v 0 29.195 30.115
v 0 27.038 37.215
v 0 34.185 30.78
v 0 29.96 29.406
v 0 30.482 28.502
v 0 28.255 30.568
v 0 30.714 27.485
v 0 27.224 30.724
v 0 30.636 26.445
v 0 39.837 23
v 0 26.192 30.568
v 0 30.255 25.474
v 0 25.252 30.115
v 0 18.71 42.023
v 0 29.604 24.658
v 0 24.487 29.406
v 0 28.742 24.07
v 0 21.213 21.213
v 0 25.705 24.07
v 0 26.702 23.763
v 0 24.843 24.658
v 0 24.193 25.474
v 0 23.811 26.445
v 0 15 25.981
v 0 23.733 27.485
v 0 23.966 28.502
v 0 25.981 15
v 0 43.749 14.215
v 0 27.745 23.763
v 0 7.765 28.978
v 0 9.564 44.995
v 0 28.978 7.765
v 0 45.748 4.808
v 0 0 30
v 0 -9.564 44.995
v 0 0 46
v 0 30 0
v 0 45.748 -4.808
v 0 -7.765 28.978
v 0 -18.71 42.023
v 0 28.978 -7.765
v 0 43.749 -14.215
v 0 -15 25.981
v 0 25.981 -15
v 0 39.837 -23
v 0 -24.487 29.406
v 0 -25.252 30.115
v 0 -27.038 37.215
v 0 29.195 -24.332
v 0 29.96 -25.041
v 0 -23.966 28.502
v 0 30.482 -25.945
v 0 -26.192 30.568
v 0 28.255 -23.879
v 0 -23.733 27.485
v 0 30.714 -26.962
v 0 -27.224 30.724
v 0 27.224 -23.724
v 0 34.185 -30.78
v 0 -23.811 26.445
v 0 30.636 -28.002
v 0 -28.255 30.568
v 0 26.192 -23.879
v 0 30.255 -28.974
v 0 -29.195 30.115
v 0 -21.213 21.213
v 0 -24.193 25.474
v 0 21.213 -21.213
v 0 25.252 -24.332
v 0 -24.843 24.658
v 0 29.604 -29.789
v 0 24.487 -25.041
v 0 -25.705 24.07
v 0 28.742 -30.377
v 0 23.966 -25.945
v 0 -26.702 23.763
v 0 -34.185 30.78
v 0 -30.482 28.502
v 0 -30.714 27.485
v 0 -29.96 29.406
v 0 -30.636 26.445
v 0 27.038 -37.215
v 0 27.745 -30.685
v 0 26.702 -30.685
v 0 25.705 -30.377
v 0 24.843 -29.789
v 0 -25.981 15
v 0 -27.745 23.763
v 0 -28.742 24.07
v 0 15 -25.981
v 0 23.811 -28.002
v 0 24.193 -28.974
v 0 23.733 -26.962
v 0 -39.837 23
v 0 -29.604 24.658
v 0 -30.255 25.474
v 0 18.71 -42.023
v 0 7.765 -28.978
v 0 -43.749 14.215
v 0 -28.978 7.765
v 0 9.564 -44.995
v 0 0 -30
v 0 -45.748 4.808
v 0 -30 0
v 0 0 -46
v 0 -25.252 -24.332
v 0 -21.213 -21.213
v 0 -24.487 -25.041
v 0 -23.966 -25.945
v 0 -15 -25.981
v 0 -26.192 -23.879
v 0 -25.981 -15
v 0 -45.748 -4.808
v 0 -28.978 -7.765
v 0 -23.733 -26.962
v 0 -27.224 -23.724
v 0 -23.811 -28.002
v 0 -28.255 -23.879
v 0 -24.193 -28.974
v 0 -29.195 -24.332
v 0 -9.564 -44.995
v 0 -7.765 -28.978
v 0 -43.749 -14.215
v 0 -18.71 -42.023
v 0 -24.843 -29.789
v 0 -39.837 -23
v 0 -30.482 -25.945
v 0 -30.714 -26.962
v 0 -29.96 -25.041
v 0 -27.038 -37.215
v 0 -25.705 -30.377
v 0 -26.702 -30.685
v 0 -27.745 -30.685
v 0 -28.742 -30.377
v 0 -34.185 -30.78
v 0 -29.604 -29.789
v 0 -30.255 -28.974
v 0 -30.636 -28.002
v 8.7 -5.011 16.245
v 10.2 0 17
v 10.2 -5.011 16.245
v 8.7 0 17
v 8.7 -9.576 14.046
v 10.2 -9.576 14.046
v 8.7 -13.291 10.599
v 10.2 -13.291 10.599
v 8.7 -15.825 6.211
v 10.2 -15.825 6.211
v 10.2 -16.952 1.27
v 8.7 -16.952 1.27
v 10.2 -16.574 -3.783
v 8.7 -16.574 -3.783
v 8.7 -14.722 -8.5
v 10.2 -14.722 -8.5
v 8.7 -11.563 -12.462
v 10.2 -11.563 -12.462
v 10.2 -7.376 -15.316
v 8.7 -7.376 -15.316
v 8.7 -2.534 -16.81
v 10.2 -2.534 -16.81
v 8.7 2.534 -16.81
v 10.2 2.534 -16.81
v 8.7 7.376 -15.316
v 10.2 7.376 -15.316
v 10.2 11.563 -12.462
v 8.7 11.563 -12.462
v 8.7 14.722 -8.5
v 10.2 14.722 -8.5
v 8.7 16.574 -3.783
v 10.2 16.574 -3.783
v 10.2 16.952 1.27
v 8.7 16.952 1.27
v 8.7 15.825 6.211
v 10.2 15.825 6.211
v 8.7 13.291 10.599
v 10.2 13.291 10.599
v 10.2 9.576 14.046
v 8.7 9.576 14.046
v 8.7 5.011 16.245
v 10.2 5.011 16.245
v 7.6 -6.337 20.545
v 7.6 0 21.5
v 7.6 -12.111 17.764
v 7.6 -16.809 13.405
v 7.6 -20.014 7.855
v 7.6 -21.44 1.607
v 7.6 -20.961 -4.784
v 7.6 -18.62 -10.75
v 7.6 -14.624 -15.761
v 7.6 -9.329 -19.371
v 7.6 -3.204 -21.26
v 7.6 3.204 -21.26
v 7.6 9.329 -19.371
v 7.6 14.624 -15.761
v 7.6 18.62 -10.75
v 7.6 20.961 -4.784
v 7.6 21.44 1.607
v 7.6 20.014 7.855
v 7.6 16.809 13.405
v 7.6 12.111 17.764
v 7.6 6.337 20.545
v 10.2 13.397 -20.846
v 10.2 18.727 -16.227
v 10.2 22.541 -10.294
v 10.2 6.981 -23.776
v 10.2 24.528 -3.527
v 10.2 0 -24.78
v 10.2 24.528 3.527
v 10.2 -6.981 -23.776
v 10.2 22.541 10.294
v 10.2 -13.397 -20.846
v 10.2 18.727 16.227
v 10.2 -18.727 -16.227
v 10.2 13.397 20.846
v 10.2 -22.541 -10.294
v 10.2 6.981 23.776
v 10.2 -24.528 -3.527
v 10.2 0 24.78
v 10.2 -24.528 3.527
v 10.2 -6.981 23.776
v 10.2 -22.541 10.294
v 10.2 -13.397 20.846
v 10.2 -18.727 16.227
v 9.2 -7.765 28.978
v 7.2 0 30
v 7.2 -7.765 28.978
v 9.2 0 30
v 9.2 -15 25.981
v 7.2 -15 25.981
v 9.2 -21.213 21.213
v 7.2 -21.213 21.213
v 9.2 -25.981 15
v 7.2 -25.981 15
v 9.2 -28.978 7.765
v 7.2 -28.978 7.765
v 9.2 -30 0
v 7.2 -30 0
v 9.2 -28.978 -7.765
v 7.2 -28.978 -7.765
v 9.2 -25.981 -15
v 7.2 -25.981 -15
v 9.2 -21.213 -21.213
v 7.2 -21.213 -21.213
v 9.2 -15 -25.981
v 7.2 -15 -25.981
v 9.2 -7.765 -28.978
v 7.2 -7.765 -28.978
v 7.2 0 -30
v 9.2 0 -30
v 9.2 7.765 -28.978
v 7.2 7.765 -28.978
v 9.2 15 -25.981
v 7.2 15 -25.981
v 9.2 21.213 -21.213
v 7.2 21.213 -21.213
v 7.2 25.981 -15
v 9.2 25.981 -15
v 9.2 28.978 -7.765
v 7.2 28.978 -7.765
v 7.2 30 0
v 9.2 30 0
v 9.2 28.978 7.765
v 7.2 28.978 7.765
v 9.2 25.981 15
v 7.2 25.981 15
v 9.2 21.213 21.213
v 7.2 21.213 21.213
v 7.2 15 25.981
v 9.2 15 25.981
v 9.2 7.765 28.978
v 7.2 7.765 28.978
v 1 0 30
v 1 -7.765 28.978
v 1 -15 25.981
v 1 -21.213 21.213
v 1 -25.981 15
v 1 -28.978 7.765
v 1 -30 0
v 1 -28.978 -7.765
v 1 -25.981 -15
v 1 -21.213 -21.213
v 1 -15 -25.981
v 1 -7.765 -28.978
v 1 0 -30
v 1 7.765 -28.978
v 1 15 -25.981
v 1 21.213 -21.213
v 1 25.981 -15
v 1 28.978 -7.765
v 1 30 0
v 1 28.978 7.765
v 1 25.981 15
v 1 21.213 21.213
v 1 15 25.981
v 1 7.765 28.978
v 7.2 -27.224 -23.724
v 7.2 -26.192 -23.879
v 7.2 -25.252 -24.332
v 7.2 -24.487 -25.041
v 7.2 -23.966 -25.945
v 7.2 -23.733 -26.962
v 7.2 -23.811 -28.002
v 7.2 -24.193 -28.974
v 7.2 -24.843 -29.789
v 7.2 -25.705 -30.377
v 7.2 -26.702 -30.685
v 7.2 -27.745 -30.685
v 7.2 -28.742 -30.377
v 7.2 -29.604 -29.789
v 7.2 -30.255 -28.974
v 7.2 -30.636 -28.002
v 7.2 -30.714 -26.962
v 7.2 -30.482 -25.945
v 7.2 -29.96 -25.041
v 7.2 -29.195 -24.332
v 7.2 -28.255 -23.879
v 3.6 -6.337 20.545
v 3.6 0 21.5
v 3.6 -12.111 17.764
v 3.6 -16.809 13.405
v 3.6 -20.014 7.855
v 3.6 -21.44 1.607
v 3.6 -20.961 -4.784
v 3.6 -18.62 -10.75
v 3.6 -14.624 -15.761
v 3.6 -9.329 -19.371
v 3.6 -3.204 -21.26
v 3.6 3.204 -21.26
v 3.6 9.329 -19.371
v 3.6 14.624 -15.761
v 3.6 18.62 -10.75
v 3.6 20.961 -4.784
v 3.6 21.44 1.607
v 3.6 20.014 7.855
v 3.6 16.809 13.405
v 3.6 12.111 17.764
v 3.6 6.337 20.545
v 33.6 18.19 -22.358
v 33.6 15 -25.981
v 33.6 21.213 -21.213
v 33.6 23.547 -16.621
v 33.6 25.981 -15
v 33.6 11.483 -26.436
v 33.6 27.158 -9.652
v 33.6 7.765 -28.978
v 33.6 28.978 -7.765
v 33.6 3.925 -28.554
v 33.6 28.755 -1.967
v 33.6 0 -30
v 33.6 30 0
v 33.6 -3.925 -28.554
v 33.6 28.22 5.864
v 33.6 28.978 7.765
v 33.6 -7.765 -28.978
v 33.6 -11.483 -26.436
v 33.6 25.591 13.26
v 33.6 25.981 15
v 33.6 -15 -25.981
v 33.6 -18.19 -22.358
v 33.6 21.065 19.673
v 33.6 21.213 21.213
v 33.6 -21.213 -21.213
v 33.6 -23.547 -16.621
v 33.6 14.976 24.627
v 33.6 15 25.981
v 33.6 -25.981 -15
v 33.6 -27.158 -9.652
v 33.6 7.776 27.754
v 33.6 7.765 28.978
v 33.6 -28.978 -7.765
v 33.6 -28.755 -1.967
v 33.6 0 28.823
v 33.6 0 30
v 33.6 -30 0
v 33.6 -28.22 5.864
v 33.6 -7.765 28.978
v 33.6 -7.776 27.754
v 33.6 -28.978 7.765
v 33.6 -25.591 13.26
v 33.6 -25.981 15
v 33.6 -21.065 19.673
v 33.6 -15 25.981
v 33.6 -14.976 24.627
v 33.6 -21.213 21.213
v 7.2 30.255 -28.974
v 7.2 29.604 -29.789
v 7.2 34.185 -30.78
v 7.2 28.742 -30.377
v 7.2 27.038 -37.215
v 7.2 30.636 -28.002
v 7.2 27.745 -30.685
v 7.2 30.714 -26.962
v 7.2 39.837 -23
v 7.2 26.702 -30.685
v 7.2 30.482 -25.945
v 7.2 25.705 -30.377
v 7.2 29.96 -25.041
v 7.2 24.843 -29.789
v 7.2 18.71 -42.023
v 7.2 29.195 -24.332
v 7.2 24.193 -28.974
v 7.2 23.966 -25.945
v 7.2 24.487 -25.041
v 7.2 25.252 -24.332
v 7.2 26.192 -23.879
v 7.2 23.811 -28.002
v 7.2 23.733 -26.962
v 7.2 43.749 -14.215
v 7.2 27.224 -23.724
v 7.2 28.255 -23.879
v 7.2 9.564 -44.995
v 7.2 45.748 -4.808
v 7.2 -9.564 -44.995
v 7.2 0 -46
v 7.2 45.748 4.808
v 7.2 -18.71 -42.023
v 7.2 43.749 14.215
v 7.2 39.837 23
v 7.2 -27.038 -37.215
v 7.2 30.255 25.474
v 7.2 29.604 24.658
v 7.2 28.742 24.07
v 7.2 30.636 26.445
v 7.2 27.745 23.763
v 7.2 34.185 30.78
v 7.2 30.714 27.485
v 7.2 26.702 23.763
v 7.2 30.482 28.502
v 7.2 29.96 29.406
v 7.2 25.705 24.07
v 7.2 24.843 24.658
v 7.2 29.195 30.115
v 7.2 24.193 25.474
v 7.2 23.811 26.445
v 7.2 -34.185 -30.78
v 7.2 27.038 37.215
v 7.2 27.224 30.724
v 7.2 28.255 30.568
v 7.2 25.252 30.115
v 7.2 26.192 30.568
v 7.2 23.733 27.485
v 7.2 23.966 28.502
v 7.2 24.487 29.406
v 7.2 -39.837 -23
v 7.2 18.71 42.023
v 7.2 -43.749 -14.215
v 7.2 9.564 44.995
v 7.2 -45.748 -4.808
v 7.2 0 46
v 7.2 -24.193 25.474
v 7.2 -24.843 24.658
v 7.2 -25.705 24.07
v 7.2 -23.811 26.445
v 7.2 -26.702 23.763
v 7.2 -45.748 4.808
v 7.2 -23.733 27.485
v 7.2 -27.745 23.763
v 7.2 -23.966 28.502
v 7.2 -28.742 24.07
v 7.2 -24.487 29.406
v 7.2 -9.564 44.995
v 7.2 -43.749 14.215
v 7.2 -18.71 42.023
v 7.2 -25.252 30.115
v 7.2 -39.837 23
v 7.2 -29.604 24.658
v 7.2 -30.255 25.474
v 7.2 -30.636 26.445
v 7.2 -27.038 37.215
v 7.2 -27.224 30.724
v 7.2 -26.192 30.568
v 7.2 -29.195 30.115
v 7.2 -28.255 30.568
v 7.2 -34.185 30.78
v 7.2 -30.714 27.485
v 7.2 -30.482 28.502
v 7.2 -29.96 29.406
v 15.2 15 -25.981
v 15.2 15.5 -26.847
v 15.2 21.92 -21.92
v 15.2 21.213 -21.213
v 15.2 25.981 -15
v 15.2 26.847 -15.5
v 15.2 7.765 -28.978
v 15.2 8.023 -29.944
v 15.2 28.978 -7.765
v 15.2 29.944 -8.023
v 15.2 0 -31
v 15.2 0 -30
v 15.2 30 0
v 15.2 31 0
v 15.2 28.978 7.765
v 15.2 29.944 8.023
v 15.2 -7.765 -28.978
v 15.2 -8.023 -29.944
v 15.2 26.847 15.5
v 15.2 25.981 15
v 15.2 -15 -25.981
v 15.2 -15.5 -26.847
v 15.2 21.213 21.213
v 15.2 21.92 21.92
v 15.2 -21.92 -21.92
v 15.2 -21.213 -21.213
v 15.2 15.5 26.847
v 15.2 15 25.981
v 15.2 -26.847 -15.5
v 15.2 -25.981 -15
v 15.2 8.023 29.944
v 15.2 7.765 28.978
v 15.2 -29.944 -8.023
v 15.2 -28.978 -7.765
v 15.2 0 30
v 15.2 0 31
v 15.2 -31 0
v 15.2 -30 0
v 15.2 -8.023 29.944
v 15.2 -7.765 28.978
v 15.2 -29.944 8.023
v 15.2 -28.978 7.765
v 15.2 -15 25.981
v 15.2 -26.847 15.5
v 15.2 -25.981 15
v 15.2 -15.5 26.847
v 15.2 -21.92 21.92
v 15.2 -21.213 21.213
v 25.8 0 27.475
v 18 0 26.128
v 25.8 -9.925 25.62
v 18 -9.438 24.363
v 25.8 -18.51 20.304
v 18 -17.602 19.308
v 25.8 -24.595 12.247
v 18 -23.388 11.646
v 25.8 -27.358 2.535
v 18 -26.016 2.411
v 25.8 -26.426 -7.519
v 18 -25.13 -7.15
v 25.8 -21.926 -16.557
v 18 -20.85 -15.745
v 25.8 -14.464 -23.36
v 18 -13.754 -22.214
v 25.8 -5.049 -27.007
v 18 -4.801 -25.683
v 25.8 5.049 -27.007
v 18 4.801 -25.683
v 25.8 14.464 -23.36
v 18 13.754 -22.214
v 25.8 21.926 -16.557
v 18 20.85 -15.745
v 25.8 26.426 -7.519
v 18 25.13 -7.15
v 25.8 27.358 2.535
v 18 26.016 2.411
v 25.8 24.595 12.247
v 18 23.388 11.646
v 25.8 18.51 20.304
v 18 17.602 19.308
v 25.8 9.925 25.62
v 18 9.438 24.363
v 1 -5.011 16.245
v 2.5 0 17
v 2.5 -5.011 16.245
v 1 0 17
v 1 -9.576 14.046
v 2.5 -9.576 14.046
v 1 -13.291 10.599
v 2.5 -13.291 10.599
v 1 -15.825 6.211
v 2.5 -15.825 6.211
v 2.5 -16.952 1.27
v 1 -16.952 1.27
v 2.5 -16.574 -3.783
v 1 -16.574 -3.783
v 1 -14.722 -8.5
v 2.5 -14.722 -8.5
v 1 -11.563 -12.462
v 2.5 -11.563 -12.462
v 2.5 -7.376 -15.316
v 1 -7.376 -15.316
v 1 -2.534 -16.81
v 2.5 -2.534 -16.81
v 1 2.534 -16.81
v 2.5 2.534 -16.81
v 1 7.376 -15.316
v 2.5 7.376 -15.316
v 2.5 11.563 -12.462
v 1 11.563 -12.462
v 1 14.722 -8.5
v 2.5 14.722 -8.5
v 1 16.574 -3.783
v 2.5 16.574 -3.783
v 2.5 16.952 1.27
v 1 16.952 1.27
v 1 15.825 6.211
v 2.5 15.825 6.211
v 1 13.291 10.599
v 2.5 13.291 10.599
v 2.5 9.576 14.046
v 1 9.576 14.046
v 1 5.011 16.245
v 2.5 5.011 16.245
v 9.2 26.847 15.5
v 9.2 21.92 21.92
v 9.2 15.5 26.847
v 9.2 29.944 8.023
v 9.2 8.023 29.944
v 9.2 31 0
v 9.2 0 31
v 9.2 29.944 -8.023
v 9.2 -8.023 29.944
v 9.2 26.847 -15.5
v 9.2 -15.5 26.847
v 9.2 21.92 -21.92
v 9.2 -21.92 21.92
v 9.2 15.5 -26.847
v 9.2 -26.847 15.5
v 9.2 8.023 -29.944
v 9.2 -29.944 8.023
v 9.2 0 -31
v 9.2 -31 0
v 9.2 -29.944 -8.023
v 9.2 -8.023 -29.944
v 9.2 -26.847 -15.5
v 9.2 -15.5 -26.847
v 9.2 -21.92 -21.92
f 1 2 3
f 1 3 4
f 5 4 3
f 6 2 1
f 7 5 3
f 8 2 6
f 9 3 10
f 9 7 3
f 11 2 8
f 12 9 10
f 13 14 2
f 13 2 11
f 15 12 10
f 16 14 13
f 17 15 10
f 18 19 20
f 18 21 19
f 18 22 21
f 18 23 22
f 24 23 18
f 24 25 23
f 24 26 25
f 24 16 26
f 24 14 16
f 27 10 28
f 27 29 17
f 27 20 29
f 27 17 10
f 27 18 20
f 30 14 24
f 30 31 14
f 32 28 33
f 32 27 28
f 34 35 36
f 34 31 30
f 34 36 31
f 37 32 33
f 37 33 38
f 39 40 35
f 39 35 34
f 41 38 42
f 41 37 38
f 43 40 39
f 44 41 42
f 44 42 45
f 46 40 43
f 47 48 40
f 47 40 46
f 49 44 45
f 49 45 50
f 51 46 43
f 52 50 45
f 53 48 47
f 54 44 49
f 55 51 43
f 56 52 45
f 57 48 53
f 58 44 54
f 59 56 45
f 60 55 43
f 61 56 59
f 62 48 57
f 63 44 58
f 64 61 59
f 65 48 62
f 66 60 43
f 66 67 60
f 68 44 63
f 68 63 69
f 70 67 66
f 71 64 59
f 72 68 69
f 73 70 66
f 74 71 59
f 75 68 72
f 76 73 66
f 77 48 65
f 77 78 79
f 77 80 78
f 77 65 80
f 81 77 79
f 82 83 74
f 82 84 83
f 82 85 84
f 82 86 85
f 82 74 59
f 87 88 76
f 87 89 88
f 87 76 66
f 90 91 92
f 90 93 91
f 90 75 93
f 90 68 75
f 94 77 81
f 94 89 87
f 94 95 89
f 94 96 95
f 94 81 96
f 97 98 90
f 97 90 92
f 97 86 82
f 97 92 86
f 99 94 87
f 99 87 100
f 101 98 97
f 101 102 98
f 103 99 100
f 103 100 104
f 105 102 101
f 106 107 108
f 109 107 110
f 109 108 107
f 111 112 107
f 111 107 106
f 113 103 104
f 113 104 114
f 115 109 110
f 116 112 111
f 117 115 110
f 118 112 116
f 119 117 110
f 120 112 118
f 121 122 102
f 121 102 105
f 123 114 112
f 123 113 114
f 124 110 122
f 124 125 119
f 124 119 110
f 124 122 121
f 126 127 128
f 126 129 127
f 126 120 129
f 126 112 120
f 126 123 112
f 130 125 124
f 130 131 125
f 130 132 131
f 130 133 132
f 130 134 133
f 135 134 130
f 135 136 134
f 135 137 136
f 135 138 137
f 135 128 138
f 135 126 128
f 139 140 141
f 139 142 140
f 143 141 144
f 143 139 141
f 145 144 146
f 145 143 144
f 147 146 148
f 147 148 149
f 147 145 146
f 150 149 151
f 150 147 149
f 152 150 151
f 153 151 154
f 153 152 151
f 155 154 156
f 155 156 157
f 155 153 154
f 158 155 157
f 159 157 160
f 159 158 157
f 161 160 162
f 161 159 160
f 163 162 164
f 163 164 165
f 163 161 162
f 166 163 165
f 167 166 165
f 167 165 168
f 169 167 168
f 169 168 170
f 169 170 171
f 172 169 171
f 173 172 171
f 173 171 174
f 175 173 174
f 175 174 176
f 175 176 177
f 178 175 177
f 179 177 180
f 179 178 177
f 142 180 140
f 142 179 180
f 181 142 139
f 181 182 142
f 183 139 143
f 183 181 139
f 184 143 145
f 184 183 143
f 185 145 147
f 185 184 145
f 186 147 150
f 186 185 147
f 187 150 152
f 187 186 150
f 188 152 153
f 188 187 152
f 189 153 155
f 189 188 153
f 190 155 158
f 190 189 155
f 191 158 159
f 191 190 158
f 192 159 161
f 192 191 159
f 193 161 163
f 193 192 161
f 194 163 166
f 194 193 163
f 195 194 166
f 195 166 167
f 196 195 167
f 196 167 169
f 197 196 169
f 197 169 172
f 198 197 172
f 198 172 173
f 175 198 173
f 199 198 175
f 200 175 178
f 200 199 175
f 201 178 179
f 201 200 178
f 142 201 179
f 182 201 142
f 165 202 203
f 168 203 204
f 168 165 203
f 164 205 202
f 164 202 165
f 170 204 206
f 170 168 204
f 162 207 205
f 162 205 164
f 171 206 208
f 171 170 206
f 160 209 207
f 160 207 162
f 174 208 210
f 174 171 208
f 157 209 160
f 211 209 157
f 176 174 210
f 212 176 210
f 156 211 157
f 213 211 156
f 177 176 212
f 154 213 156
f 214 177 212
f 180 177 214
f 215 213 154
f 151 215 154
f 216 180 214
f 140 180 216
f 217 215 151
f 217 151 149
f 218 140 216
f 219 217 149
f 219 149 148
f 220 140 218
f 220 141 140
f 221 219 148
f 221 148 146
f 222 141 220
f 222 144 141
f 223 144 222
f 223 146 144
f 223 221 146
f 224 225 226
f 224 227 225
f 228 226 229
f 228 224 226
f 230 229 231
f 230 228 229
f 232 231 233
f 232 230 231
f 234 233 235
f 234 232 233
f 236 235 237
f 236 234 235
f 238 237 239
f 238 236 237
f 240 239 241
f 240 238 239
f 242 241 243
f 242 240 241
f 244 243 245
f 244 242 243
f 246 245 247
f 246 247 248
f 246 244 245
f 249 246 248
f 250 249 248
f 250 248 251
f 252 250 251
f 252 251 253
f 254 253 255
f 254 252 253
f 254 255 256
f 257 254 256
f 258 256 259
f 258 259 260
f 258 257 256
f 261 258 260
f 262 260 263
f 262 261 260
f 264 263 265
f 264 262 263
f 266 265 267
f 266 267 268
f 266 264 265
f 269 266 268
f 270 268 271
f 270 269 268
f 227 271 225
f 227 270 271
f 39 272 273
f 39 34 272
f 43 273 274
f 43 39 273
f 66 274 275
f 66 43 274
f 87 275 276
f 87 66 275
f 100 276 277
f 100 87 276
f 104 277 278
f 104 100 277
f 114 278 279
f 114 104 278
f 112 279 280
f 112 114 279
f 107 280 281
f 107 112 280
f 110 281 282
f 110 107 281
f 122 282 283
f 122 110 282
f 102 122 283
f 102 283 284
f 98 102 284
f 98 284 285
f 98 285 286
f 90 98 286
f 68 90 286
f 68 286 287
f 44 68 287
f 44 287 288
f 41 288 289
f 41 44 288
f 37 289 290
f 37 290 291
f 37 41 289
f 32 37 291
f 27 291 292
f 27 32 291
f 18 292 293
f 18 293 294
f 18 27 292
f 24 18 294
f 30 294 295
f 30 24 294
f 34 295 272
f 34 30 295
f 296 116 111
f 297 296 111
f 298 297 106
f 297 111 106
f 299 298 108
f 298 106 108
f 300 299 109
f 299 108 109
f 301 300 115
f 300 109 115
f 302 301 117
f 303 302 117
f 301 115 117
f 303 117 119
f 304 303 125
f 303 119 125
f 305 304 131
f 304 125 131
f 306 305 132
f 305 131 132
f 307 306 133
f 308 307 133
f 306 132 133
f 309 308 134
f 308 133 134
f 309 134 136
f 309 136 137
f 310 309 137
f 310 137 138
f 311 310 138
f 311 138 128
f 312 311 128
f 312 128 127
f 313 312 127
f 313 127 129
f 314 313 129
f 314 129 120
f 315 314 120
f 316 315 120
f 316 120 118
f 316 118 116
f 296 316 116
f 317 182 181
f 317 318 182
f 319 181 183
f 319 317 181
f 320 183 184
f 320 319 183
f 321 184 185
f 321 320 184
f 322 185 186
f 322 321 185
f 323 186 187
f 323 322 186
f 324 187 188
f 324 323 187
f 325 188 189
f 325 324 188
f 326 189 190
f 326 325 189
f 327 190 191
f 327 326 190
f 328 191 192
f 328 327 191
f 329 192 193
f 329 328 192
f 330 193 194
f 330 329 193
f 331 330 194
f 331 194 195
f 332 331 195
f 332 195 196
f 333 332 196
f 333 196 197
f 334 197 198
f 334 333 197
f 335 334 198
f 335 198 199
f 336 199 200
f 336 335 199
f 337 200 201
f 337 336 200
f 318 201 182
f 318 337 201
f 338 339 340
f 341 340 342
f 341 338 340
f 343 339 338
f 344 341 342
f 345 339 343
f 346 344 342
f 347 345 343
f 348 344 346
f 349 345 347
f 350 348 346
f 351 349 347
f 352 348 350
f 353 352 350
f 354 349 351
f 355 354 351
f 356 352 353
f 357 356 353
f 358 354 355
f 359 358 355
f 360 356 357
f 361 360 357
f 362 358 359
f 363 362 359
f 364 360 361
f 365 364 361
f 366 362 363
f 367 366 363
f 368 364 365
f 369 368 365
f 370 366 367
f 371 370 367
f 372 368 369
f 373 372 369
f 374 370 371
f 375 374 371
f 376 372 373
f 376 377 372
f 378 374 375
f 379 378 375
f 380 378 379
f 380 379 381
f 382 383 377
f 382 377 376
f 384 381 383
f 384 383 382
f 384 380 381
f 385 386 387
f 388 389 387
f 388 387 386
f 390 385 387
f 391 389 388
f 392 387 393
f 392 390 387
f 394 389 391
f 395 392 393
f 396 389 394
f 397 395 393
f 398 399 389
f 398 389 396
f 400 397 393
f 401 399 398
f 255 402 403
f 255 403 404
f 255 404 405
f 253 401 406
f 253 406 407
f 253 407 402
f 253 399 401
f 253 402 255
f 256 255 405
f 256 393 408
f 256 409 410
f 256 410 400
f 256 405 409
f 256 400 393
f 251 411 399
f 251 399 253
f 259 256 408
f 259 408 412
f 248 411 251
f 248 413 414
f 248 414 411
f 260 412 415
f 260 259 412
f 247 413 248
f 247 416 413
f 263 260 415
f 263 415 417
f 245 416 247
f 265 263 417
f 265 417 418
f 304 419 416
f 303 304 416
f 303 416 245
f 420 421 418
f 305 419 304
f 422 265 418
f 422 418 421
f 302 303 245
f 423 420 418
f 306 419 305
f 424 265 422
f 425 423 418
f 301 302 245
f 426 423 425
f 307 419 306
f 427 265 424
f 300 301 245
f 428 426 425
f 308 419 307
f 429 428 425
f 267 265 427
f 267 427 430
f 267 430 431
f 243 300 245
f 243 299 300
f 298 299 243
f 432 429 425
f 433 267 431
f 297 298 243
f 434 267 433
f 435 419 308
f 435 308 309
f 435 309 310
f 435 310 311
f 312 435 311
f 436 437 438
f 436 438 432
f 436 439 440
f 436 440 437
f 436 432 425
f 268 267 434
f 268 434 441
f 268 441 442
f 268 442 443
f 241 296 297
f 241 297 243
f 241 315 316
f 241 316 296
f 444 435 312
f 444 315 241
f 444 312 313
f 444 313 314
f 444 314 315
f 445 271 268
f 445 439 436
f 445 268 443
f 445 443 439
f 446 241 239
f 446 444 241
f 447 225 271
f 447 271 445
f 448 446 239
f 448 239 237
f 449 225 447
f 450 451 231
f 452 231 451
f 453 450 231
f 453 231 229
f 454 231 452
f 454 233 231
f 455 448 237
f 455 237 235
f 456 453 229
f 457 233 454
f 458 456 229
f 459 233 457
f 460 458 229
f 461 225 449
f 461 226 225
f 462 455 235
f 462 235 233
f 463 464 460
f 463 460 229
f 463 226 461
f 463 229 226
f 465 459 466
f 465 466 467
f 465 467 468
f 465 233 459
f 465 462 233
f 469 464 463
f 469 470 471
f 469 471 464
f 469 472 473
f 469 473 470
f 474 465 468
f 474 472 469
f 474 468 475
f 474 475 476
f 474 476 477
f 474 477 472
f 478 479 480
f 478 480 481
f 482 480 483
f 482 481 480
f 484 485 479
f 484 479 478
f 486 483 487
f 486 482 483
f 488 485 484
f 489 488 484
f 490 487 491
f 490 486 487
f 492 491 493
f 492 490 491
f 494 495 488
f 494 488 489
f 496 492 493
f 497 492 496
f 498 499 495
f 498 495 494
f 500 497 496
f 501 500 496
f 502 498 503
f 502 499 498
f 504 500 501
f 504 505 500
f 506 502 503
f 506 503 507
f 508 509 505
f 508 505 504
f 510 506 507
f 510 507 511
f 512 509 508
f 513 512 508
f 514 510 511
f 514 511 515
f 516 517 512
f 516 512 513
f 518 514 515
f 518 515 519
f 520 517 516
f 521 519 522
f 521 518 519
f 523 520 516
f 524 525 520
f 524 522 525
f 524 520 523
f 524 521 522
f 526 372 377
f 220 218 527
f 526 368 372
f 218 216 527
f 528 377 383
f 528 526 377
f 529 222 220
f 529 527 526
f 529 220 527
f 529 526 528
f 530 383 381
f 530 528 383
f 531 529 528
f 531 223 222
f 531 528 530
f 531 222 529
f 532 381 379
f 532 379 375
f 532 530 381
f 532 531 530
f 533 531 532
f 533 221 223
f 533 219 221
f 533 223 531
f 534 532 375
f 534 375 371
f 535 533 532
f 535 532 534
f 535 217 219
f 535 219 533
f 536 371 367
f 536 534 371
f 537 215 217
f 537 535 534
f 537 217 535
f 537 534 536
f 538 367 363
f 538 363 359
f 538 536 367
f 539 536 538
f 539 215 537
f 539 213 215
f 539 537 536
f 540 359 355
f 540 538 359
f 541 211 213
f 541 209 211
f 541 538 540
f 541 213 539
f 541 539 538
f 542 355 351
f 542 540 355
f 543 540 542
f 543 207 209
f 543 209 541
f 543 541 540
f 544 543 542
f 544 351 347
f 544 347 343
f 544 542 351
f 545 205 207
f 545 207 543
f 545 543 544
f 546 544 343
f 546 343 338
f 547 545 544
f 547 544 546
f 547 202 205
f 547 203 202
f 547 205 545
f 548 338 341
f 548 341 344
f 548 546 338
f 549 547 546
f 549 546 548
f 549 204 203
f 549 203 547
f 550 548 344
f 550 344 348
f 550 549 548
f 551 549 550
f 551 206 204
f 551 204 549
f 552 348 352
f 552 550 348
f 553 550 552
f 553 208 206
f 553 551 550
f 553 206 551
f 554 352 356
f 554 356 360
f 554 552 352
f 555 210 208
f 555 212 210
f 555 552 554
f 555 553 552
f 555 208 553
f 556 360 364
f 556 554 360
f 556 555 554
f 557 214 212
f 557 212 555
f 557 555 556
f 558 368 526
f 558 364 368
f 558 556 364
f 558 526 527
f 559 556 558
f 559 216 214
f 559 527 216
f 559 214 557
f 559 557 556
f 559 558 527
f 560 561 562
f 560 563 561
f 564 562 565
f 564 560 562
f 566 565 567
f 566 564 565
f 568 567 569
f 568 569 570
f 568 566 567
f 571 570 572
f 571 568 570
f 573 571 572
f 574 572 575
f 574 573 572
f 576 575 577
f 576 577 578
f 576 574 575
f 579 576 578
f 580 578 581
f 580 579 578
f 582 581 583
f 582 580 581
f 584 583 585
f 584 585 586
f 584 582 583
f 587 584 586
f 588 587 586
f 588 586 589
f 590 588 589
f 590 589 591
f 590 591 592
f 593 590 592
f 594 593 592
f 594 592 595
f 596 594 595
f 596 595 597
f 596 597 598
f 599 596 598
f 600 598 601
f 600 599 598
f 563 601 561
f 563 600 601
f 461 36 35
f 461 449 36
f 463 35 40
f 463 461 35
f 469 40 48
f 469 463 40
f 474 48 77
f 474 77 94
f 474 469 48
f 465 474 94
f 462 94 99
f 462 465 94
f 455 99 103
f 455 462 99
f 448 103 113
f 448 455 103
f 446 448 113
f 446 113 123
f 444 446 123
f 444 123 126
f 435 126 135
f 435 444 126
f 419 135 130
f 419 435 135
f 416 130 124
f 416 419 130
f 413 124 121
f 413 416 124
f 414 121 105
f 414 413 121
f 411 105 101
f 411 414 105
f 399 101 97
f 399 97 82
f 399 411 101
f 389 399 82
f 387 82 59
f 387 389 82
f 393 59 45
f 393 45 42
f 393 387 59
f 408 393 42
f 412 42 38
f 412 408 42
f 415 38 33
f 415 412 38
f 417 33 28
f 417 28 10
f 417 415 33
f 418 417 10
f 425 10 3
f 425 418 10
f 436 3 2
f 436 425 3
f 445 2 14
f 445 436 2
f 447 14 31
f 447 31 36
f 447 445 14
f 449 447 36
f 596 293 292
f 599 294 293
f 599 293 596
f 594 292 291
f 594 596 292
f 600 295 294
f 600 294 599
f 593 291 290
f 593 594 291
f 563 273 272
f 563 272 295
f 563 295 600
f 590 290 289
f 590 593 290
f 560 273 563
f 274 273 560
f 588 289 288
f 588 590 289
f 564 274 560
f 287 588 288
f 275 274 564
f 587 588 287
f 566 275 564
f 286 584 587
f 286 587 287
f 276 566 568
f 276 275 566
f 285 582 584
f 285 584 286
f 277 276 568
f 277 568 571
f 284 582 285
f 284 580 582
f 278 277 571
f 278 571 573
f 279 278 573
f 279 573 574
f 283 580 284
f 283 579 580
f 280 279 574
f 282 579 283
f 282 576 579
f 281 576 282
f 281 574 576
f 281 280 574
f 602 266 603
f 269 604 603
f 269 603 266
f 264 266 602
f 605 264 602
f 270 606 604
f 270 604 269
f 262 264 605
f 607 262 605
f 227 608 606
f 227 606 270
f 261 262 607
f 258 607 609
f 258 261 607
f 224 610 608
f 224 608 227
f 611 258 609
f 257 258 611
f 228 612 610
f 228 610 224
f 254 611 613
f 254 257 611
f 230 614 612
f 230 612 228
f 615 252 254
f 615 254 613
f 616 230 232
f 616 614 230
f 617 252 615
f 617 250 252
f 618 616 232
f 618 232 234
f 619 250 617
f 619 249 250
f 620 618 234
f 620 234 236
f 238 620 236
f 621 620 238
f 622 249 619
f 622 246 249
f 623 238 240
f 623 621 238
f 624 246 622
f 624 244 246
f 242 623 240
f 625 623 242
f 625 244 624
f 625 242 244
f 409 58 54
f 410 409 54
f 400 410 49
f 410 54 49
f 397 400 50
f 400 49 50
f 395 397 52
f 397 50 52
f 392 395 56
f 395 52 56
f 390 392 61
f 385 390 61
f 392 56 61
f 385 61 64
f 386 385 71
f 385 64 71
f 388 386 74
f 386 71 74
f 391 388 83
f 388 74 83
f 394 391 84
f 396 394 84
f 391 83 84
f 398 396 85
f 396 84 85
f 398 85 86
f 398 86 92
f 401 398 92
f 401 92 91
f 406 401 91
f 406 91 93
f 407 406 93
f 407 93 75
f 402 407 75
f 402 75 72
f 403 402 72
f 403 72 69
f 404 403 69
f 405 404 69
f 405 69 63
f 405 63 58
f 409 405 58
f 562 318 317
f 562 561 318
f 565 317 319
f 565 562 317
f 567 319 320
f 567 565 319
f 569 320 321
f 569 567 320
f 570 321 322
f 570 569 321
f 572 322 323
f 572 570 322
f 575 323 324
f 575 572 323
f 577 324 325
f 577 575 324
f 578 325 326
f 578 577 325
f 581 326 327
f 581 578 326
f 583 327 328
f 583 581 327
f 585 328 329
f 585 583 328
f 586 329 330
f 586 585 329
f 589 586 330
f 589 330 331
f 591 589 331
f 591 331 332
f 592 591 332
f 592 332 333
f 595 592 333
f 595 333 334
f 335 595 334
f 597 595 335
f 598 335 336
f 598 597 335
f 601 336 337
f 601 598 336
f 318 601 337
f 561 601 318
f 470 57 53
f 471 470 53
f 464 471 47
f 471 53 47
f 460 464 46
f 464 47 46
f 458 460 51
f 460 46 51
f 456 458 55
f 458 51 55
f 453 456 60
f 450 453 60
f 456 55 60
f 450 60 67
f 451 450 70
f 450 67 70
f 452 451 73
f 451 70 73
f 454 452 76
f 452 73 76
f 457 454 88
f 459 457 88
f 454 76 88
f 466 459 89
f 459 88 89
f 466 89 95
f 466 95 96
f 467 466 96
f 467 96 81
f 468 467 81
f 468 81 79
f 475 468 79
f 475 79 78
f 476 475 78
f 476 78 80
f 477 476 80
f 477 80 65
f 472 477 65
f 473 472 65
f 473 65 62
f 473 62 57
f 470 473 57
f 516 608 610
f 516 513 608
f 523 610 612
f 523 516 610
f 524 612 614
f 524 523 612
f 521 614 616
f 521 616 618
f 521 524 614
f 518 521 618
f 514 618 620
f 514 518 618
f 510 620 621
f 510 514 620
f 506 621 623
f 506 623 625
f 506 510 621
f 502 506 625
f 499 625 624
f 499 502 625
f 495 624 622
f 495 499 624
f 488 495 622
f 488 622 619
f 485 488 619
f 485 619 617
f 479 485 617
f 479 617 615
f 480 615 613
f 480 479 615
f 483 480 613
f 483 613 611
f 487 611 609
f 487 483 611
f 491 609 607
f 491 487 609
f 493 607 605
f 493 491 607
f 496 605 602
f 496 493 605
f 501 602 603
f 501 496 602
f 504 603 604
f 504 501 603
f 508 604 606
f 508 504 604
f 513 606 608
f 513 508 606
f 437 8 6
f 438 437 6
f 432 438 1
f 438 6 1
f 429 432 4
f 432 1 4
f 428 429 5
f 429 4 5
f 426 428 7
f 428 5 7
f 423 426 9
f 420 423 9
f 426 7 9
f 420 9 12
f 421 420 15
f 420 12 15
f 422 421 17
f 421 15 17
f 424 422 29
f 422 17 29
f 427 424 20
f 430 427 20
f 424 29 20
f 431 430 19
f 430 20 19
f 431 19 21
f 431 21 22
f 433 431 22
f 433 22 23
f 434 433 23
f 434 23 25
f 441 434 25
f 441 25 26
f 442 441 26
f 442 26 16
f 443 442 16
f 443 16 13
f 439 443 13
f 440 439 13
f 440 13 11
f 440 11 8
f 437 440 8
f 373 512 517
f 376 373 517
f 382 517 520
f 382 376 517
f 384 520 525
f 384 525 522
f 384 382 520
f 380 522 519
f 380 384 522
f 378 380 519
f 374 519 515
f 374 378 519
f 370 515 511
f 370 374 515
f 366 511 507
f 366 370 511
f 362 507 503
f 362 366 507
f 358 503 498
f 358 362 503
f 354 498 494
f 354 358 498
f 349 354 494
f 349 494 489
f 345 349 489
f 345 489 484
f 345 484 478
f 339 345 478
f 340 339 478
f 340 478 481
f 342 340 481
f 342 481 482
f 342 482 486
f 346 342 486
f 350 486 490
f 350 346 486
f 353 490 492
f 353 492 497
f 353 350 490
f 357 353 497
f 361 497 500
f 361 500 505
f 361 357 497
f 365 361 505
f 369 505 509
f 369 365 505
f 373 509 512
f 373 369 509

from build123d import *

# Parameters (mm, degrees)
SKETCH_2_R          = 3.5
CUT_EXTRUDE_1_DEPTH = 74.218576878


with BuildPart() as part:
    # 草图1 → 旋转1 (revolve)
    with BuildSketch(Plane.XY, mode=Mode.PRIVATE) as revolve_1_sk:
        Polygon((3.6, 21.5), (2.5, 17), (1, 17), (1, 30), (0, 30), (0, 46), (7.2, 46), (7.2, 30), (9.2, 30), (9.2, 31), (15.2, 31), (15.2, 30), (33.6, 30), (33.6, 28.8226), (10.2, 24.78), (10.2, 17), (8.7, 17), (7.6, 21.5), align=None)
    revolve(revolve_1_sk.sketch.rotate(Axis((0, 0, 0), (1, 0, 0)), 90), axis=Axis((0, 0, 0), (1, 0, 0)))

    # 草图2 → 切除-拉伸1 (cut, through all)
    with BuildSketch(Plane.ZY):
        with Locations((-27.223611076, 27.223611076)):
            Circle(SKETCH_2_R)
        with Locations((27.223611076, 27.223611076)):
            Circle(SKETCH_2_R)
        with Locations((-27.223611076, -27.223611076)):
            Circle(SKETCH_2_R)
        with Locations((27.223611076, -27.223611076)):
            Circle(SKETCH_2_R)
    extrude(amount=-CUT_EXTRUDE_1_DEPTH, mode=Mode.SUBTRACT)


solid = part.part
